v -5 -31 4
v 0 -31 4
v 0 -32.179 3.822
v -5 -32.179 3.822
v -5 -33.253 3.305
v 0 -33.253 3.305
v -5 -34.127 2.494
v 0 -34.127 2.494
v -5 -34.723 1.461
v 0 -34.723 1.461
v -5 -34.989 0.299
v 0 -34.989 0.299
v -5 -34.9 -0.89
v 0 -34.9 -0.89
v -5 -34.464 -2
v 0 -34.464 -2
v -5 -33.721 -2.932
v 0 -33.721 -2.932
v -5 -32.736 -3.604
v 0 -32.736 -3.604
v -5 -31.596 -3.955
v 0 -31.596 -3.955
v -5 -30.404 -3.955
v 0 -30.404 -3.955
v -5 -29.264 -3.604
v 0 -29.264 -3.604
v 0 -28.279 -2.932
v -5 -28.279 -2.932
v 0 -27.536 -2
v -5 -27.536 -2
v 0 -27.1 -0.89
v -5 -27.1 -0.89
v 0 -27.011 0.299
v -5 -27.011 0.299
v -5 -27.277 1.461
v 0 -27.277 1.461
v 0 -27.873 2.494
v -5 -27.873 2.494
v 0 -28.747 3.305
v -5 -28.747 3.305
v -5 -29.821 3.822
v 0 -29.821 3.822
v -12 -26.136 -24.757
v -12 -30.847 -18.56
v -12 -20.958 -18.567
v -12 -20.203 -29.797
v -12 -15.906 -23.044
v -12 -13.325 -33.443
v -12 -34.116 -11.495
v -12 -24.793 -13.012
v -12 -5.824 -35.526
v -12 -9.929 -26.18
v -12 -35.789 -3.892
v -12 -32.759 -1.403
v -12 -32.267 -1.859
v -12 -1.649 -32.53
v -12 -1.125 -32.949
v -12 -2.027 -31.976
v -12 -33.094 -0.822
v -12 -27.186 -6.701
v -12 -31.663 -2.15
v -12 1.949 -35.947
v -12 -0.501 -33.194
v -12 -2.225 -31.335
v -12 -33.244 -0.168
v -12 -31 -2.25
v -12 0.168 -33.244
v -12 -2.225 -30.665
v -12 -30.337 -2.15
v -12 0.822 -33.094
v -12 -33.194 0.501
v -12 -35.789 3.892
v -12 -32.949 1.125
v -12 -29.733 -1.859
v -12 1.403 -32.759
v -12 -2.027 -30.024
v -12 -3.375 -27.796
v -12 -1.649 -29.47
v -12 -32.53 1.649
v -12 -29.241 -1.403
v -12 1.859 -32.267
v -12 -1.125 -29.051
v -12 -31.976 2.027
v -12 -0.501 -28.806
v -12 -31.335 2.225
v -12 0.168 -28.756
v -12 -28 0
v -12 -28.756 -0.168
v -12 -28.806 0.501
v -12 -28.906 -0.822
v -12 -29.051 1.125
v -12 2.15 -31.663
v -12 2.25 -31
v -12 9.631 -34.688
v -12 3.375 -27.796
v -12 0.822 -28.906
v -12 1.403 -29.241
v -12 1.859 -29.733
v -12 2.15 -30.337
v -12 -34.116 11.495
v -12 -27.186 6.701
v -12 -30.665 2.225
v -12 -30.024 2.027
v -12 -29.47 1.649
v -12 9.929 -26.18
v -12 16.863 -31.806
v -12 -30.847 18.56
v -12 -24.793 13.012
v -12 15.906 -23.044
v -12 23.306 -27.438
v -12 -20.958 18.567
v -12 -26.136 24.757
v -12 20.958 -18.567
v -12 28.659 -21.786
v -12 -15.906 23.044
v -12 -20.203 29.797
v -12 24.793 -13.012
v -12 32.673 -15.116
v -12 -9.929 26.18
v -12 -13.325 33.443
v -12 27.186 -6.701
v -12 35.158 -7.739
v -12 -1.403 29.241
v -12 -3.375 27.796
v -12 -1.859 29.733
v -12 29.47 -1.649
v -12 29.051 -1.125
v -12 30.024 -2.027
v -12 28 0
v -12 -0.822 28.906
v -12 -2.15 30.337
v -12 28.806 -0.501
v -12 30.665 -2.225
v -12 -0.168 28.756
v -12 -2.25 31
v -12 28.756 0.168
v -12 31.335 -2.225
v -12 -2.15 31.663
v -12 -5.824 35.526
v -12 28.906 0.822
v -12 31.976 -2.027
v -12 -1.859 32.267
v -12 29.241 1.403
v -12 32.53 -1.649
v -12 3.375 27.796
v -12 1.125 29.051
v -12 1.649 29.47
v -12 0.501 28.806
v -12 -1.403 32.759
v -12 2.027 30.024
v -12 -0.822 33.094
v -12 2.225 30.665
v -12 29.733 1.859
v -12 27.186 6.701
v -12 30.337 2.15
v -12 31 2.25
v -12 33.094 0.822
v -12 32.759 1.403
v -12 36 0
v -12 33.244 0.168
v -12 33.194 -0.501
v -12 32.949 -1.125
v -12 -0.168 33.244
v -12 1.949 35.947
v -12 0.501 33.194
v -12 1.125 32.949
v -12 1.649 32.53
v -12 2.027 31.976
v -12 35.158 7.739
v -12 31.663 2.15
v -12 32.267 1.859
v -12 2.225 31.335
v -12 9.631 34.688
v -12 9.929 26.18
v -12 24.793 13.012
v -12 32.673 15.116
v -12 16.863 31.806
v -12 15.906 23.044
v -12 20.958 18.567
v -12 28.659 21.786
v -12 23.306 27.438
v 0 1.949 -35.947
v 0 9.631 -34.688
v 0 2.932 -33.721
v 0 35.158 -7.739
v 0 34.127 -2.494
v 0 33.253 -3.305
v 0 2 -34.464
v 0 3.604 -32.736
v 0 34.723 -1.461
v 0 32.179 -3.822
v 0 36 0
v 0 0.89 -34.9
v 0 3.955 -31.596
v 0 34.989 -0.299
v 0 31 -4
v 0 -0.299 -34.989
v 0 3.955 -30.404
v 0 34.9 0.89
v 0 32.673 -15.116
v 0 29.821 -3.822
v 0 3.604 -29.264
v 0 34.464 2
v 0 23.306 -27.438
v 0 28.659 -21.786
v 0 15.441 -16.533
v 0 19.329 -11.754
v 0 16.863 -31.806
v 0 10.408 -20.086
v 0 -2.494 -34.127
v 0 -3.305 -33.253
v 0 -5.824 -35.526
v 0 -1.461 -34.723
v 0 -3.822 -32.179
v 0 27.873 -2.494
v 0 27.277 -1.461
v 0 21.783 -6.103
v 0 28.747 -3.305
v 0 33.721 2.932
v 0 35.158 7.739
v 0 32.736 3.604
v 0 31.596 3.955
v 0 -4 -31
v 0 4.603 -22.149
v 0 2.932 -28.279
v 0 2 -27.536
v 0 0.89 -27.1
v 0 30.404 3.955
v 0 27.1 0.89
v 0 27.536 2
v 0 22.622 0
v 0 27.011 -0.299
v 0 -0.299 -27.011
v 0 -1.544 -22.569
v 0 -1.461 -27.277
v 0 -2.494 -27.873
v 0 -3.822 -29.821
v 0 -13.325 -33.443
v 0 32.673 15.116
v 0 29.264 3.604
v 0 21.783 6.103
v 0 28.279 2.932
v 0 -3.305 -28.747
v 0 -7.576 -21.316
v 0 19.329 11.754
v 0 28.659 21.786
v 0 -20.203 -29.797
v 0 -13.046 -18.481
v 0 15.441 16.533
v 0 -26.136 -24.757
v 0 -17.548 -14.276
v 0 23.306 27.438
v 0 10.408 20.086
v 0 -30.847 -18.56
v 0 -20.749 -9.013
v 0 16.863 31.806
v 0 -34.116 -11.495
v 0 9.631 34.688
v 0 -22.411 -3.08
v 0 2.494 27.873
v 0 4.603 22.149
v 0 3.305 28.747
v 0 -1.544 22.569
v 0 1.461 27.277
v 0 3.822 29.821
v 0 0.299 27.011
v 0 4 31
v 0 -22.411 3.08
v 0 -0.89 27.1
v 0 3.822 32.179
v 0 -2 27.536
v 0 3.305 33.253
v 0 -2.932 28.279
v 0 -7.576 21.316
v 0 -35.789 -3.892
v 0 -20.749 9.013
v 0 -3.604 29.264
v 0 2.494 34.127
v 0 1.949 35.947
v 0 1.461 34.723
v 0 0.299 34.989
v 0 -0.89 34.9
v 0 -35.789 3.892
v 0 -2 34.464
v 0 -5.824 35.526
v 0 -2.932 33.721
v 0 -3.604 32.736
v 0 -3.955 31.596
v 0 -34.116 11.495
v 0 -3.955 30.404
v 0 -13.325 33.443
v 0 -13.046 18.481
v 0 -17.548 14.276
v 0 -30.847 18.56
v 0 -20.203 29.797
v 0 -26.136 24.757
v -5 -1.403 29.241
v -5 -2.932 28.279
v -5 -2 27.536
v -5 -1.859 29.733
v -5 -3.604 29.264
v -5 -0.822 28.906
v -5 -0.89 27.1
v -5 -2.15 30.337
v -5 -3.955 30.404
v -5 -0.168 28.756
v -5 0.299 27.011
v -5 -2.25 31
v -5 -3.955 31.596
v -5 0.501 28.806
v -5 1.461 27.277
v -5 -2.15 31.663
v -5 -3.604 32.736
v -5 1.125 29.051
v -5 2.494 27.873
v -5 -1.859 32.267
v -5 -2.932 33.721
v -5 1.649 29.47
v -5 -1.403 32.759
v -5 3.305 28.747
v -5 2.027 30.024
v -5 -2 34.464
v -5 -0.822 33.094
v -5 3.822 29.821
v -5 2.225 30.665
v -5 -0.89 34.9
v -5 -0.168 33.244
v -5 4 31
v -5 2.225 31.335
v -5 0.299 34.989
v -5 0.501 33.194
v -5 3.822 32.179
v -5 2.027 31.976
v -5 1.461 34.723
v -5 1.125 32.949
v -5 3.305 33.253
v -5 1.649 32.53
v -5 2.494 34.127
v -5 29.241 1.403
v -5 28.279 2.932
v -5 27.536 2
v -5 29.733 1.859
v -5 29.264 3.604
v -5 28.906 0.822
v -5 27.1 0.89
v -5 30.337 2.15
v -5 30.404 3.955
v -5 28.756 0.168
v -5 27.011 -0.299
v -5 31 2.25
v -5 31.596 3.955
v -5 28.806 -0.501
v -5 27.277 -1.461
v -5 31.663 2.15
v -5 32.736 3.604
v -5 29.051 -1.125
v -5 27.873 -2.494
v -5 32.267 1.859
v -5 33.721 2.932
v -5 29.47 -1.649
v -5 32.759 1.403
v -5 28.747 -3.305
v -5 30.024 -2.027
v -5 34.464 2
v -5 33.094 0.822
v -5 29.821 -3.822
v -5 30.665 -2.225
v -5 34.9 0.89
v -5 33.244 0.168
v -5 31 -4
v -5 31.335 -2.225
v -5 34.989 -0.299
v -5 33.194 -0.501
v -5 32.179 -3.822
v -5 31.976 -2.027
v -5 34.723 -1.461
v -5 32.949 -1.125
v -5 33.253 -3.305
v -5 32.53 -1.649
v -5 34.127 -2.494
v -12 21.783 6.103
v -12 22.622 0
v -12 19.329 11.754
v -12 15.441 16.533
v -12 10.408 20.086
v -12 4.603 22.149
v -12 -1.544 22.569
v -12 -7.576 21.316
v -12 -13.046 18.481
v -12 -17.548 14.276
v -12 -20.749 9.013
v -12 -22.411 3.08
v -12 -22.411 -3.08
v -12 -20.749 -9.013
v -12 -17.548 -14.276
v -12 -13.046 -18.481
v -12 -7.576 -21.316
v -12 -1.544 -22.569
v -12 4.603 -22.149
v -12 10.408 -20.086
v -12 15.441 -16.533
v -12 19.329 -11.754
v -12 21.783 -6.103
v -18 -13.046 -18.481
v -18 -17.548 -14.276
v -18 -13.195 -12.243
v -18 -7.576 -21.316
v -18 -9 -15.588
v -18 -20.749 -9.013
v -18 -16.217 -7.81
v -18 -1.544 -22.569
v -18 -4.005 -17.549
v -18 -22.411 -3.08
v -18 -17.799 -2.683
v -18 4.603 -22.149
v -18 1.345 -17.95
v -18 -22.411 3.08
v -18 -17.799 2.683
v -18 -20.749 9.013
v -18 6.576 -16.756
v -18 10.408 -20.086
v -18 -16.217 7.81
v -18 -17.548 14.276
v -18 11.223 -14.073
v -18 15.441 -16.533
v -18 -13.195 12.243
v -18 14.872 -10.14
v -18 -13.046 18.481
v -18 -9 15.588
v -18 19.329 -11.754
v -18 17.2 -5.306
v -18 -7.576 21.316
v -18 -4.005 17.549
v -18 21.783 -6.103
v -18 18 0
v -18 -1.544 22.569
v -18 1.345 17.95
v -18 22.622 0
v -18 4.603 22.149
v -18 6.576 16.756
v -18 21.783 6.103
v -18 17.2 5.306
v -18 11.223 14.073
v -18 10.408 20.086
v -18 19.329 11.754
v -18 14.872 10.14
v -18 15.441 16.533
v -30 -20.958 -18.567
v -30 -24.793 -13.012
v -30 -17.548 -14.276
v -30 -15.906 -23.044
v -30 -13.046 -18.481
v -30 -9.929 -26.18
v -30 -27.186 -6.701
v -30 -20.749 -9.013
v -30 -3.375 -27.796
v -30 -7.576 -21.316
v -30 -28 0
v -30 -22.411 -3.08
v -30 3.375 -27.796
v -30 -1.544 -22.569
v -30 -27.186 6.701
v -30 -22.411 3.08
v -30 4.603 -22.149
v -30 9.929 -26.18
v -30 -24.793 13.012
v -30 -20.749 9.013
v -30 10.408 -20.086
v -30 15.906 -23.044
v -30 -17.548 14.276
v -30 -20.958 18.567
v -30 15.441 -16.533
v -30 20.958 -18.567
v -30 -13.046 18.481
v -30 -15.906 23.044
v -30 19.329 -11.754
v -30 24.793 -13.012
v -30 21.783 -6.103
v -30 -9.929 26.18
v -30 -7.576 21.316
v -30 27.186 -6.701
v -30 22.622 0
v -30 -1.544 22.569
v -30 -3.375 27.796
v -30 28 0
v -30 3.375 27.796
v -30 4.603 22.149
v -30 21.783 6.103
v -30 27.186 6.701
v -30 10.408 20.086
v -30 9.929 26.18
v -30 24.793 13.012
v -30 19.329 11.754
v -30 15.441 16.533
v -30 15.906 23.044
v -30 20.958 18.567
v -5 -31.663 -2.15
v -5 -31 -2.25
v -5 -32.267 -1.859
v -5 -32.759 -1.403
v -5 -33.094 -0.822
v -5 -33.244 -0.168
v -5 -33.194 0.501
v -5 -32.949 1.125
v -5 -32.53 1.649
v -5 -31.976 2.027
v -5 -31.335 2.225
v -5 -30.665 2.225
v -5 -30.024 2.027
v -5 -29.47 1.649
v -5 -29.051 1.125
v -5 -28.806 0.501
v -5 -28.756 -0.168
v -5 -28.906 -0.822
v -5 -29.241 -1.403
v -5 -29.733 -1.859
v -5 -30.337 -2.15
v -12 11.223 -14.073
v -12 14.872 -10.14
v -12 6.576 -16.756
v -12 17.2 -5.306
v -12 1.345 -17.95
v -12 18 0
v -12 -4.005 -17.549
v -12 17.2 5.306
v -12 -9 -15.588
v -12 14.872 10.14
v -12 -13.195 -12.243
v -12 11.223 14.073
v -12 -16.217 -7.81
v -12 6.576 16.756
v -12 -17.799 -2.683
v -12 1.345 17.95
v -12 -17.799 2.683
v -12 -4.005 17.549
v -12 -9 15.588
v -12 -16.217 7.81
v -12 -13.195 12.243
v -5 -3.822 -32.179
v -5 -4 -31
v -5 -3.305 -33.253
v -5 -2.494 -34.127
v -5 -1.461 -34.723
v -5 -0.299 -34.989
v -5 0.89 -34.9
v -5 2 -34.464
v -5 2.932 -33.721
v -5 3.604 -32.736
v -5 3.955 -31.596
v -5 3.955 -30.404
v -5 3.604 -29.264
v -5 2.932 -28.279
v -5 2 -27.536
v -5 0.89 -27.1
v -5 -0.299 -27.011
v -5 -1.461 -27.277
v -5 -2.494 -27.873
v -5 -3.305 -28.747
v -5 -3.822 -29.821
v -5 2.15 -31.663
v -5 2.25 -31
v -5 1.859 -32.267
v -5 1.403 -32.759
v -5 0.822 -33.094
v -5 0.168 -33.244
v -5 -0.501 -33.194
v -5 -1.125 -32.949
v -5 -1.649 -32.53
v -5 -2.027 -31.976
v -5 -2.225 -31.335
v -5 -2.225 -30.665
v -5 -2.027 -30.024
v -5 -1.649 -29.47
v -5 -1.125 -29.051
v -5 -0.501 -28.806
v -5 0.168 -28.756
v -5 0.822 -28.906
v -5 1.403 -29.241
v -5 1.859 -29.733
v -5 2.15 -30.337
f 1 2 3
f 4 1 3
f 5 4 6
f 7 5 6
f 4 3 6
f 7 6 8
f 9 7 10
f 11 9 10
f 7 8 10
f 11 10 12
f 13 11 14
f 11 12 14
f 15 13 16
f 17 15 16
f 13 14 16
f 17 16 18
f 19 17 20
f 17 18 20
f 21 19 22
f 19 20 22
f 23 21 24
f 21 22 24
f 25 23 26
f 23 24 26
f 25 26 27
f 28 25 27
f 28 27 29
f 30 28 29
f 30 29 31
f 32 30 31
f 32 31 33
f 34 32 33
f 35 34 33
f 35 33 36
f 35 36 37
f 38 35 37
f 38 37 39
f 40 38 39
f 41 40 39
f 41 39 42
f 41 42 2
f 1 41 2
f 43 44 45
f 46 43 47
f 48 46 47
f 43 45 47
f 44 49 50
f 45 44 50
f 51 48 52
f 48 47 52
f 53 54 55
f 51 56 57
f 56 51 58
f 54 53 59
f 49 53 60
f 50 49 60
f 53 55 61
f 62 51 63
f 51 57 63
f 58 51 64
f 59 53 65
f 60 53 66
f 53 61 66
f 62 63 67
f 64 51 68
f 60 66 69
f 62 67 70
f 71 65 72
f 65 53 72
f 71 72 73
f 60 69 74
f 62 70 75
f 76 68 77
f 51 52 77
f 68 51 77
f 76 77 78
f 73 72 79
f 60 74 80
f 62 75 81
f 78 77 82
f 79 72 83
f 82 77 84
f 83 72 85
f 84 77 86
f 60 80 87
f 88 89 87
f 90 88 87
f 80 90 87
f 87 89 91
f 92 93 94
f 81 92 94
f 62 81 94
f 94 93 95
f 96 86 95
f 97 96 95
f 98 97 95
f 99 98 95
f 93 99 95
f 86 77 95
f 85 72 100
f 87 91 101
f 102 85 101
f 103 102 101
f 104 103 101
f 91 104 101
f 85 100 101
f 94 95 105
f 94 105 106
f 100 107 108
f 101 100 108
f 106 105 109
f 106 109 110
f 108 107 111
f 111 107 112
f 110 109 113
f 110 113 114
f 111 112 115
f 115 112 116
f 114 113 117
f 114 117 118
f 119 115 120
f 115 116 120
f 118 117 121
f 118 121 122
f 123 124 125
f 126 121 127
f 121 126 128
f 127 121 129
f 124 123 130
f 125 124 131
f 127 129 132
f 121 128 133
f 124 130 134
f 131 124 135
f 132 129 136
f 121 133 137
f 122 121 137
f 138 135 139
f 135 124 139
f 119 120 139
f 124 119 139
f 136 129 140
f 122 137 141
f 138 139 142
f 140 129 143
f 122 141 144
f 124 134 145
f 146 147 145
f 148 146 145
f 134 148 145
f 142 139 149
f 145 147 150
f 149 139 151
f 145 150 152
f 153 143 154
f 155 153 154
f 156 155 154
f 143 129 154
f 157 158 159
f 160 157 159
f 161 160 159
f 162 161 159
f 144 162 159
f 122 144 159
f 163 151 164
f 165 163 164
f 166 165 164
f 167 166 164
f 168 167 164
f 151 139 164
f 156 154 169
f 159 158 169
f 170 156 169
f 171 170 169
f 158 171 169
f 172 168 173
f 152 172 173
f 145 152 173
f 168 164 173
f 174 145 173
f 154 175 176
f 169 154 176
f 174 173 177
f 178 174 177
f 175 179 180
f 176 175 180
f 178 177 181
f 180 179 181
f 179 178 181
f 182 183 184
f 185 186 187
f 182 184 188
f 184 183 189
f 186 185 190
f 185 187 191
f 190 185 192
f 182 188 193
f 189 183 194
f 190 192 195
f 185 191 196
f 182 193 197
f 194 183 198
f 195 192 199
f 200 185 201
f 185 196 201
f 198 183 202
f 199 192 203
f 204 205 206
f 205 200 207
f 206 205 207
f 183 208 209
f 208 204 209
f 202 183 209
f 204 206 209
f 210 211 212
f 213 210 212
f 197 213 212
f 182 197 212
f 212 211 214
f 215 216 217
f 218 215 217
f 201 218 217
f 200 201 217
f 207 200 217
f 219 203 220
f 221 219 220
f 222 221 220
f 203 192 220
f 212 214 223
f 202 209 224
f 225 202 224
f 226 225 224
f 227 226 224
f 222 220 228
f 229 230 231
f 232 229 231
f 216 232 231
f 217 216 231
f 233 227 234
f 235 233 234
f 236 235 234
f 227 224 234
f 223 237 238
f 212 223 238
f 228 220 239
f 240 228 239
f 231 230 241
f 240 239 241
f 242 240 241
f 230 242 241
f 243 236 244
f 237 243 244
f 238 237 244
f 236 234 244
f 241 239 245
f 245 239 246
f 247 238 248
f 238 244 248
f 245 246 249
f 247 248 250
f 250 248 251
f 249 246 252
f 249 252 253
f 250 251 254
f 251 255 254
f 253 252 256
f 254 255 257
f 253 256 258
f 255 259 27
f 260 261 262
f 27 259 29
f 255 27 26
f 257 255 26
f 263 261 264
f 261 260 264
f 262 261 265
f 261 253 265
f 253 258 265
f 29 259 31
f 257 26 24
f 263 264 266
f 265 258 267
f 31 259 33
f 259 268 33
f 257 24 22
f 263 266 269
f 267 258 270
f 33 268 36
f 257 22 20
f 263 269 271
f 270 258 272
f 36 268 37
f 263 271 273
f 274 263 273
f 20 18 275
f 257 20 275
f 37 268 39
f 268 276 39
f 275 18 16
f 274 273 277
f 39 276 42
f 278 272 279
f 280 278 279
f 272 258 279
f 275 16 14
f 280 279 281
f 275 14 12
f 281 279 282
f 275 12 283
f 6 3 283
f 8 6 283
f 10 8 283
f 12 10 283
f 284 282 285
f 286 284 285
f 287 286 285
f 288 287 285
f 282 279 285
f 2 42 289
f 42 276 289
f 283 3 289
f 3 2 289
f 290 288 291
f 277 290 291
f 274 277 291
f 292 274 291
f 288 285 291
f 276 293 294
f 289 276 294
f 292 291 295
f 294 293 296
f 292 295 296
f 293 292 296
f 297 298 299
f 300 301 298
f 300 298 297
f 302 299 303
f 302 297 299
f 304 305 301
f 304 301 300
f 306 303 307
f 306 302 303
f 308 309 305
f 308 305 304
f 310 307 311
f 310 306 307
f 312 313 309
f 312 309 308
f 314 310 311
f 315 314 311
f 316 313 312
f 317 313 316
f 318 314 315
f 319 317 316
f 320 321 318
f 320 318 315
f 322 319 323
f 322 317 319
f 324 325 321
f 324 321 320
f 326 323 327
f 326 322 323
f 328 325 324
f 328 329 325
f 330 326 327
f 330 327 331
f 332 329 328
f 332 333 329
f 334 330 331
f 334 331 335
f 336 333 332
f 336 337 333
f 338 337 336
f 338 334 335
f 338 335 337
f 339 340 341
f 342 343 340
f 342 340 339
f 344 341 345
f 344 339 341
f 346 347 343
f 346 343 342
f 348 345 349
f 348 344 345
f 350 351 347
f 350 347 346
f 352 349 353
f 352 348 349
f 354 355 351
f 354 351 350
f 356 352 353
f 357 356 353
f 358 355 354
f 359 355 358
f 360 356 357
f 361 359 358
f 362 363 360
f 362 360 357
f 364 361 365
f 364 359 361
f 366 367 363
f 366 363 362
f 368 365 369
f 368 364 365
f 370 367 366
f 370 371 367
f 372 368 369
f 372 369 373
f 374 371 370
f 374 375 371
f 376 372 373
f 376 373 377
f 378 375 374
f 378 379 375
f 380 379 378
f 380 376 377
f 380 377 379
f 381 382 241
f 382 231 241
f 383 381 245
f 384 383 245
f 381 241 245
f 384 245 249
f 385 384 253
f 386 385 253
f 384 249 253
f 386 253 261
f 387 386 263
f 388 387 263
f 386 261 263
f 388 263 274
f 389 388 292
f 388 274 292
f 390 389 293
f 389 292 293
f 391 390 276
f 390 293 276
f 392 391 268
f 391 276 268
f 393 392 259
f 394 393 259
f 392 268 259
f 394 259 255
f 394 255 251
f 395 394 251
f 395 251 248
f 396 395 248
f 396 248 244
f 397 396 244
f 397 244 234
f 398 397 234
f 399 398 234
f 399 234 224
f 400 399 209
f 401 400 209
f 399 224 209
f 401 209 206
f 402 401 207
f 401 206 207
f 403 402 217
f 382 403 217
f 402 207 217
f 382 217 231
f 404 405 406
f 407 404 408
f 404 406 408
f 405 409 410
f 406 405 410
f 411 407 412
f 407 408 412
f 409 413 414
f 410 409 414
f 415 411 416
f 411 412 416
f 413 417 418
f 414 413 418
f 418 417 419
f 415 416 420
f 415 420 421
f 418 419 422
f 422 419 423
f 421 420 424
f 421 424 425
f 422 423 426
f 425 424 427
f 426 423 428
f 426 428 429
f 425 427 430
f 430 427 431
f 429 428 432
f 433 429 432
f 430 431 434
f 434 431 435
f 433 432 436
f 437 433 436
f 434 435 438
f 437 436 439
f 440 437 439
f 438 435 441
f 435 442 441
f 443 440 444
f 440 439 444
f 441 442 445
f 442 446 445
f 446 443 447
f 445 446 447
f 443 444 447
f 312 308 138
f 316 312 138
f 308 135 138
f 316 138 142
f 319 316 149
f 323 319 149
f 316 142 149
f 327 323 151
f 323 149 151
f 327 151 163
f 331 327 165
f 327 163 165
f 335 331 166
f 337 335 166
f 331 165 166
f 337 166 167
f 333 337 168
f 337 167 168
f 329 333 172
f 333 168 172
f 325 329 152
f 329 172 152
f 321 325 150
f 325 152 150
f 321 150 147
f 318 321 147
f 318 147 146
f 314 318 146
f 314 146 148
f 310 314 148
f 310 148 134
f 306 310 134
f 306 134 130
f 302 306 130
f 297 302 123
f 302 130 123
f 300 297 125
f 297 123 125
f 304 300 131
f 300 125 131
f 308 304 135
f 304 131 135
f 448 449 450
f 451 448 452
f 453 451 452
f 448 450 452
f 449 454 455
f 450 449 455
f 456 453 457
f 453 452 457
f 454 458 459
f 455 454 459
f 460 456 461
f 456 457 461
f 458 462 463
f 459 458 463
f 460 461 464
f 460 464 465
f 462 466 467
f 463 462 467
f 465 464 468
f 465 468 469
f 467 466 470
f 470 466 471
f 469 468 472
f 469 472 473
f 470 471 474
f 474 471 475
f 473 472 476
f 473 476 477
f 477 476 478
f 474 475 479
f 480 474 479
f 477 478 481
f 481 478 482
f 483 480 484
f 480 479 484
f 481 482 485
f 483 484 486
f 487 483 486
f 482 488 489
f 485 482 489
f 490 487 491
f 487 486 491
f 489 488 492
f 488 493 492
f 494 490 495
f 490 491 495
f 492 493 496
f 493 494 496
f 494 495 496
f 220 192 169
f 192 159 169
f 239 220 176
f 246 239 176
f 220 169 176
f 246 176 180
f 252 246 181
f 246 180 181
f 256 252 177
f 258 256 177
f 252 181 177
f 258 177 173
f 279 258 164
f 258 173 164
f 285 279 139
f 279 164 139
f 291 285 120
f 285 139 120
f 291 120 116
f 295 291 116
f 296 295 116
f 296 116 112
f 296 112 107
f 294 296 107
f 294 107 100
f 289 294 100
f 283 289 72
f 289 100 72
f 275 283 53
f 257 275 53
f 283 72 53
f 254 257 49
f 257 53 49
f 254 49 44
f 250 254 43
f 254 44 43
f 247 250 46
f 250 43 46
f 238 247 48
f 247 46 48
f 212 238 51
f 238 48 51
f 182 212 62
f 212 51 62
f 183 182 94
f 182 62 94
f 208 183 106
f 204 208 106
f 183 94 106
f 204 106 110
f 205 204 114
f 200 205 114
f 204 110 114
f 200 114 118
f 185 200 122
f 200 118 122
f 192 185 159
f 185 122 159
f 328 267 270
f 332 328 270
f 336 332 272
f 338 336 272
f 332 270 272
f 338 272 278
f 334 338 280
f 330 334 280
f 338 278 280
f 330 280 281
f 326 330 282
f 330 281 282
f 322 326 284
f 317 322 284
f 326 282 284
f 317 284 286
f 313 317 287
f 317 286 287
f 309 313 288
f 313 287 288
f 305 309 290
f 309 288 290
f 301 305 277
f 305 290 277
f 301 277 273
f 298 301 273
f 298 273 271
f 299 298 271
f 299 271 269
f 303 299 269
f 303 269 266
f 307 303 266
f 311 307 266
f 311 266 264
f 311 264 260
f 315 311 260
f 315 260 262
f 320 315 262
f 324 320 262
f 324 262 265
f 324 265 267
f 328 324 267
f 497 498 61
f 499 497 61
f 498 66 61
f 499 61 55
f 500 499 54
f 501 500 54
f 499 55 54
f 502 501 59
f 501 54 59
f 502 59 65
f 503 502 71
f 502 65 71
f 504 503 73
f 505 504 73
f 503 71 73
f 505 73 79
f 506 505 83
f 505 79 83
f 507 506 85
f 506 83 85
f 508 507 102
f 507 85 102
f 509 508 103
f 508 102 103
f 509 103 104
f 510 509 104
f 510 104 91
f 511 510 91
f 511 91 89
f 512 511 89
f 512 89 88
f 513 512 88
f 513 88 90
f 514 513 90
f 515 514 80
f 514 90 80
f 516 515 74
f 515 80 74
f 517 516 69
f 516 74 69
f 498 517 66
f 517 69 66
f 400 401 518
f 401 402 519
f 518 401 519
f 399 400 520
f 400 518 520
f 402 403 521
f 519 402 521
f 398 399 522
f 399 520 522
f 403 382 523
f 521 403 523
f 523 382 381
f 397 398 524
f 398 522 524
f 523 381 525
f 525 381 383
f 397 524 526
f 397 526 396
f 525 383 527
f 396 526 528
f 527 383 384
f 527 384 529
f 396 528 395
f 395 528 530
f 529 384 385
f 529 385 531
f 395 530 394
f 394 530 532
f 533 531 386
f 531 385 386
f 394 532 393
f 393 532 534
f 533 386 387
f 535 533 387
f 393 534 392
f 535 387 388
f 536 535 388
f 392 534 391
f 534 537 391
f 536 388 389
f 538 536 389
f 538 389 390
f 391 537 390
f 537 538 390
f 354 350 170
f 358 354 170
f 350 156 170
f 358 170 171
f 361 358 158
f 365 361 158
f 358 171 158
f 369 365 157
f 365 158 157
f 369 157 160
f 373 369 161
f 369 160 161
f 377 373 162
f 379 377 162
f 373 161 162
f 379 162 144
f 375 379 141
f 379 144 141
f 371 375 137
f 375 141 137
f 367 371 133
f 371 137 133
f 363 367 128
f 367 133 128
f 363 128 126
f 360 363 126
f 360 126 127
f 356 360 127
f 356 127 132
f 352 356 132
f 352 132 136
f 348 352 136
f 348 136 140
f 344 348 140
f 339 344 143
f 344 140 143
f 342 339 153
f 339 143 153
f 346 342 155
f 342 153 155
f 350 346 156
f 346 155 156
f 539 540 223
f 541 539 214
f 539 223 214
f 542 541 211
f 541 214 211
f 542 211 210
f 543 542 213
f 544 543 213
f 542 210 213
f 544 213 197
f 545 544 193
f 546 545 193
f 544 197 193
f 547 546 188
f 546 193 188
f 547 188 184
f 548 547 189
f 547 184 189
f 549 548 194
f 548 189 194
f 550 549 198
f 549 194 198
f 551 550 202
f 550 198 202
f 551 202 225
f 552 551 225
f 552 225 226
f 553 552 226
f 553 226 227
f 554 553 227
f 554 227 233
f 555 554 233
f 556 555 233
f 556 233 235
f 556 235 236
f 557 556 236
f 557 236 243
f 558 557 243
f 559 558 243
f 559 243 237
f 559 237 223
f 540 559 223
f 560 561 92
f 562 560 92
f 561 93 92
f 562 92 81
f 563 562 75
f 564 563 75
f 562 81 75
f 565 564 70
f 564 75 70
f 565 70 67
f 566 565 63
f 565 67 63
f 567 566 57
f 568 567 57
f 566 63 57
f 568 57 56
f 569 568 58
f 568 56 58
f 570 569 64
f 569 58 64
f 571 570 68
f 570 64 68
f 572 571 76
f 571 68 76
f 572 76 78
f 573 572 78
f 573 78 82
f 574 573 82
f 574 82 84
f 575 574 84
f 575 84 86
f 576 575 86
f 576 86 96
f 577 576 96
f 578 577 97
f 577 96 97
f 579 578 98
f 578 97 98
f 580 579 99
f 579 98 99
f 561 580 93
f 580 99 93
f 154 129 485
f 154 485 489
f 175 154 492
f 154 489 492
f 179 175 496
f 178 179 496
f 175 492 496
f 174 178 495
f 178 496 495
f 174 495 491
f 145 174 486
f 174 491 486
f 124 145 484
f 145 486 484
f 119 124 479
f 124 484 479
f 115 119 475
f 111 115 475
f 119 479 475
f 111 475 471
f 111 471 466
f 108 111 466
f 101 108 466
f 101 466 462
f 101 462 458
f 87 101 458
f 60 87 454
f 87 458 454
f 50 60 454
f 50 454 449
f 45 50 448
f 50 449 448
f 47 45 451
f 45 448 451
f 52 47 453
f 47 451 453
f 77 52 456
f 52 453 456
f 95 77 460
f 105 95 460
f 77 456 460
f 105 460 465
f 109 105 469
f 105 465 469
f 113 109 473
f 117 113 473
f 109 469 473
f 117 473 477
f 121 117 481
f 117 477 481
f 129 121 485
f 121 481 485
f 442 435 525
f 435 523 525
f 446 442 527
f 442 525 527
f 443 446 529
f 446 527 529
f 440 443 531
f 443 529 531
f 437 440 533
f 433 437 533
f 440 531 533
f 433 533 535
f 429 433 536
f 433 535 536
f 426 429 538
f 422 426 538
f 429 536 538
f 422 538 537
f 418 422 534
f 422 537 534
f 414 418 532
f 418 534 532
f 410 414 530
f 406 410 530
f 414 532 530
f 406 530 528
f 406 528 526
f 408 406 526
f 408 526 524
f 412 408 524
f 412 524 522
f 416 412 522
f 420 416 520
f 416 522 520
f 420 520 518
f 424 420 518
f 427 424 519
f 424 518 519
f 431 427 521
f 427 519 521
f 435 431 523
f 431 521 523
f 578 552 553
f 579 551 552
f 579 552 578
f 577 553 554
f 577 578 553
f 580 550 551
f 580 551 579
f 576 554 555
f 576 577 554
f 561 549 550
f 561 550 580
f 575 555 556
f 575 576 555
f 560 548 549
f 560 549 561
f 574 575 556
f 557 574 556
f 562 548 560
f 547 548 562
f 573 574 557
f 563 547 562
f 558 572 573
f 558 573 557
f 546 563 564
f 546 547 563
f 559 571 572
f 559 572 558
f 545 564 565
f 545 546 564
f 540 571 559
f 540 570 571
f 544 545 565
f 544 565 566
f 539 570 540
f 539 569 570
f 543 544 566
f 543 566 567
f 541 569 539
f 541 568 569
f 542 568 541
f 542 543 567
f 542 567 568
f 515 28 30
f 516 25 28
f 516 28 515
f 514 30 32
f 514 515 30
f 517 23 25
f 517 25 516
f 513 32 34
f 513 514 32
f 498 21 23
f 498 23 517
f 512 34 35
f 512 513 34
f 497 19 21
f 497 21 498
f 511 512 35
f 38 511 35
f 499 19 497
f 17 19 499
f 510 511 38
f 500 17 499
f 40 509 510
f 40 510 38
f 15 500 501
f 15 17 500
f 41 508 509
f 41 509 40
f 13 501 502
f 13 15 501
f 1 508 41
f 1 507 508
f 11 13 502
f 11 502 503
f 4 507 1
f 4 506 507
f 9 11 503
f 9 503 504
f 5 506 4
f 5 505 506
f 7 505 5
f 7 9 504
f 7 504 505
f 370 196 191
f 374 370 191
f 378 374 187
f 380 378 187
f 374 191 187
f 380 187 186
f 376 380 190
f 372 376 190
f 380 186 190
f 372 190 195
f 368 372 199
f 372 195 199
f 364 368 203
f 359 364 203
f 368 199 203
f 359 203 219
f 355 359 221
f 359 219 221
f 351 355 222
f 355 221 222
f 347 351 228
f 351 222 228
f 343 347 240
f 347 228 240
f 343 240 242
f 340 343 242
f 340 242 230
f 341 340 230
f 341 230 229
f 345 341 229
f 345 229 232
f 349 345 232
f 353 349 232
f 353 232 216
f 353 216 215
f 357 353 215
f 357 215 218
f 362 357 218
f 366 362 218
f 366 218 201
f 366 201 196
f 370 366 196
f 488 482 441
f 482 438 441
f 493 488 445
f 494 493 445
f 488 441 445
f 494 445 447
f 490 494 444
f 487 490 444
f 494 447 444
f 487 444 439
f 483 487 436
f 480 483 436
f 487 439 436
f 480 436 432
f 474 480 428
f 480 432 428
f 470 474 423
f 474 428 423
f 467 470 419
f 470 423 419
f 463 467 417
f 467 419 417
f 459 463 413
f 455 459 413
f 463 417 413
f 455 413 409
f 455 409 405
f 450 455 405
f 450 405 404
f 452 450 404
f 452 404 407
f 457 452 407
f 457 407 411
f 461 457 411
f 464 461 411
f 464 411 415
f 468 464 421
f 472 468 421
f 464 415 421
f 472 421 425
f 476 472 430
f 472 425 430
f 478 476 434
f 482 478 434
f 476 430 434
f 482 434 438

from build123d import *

# Parameters (mm, degrees)
CBORE_FOR_M4_SHCS1_D           = 4.5
CBORE_FOR_M4_SHCS1_CBORE_D     = 8
CBORE_FOR_M4_SHCS1_CBORE_DEPTH = 5
CIRPATTERN1_COUNT              = 4


with BuildPart() as part:
    # Sketch1 → Revolve1 (revolve)
    with BuildSketch(Plane.XY):
        Polygon((-30, 22.621875), (-18, 22.621875), (-18, 18), (-12, 18), (-12, 22.621875), (0, 22.621875), (0, 36), (-12, 36), (-12, 28), (-30, 28), align=None)
    revolve(axis=Axis((-59.7296875, 0, 0), (1, 0, 0)))

    # CBORE for M4 SHCS1 (through all)
    with Locations(Plane(origin=(0, 0, 0), x_dir=(0, 0, -1), z_dir=(1, 0, 0))):
        with Locations((0, 31)):
            cbore_for_m4_shcs1 = CounterBoreHole(CBORE_FOR_M4_SHCS1_D / 2, CBORE_FOR_M4_SHCS1_CBORE_D / 2, CBORE_FOR_M4_SHCS1_CBORE_DEPTH)

    # CirPattern1: CBORE for M4 SHCS1 ×4 about axis
    cirpattern1_axis = Axis((0, 0, 0), (1, 0, 0))
    for i in range(1, CIRPATTERN1_COUNT):
        add(cbore_for_m4_shcs1.rotate(cirpattern1_axis, i * 360 / CIRPATTERN1_COUNT), mode=Mode.SUBTRACT)


solid = part.part
